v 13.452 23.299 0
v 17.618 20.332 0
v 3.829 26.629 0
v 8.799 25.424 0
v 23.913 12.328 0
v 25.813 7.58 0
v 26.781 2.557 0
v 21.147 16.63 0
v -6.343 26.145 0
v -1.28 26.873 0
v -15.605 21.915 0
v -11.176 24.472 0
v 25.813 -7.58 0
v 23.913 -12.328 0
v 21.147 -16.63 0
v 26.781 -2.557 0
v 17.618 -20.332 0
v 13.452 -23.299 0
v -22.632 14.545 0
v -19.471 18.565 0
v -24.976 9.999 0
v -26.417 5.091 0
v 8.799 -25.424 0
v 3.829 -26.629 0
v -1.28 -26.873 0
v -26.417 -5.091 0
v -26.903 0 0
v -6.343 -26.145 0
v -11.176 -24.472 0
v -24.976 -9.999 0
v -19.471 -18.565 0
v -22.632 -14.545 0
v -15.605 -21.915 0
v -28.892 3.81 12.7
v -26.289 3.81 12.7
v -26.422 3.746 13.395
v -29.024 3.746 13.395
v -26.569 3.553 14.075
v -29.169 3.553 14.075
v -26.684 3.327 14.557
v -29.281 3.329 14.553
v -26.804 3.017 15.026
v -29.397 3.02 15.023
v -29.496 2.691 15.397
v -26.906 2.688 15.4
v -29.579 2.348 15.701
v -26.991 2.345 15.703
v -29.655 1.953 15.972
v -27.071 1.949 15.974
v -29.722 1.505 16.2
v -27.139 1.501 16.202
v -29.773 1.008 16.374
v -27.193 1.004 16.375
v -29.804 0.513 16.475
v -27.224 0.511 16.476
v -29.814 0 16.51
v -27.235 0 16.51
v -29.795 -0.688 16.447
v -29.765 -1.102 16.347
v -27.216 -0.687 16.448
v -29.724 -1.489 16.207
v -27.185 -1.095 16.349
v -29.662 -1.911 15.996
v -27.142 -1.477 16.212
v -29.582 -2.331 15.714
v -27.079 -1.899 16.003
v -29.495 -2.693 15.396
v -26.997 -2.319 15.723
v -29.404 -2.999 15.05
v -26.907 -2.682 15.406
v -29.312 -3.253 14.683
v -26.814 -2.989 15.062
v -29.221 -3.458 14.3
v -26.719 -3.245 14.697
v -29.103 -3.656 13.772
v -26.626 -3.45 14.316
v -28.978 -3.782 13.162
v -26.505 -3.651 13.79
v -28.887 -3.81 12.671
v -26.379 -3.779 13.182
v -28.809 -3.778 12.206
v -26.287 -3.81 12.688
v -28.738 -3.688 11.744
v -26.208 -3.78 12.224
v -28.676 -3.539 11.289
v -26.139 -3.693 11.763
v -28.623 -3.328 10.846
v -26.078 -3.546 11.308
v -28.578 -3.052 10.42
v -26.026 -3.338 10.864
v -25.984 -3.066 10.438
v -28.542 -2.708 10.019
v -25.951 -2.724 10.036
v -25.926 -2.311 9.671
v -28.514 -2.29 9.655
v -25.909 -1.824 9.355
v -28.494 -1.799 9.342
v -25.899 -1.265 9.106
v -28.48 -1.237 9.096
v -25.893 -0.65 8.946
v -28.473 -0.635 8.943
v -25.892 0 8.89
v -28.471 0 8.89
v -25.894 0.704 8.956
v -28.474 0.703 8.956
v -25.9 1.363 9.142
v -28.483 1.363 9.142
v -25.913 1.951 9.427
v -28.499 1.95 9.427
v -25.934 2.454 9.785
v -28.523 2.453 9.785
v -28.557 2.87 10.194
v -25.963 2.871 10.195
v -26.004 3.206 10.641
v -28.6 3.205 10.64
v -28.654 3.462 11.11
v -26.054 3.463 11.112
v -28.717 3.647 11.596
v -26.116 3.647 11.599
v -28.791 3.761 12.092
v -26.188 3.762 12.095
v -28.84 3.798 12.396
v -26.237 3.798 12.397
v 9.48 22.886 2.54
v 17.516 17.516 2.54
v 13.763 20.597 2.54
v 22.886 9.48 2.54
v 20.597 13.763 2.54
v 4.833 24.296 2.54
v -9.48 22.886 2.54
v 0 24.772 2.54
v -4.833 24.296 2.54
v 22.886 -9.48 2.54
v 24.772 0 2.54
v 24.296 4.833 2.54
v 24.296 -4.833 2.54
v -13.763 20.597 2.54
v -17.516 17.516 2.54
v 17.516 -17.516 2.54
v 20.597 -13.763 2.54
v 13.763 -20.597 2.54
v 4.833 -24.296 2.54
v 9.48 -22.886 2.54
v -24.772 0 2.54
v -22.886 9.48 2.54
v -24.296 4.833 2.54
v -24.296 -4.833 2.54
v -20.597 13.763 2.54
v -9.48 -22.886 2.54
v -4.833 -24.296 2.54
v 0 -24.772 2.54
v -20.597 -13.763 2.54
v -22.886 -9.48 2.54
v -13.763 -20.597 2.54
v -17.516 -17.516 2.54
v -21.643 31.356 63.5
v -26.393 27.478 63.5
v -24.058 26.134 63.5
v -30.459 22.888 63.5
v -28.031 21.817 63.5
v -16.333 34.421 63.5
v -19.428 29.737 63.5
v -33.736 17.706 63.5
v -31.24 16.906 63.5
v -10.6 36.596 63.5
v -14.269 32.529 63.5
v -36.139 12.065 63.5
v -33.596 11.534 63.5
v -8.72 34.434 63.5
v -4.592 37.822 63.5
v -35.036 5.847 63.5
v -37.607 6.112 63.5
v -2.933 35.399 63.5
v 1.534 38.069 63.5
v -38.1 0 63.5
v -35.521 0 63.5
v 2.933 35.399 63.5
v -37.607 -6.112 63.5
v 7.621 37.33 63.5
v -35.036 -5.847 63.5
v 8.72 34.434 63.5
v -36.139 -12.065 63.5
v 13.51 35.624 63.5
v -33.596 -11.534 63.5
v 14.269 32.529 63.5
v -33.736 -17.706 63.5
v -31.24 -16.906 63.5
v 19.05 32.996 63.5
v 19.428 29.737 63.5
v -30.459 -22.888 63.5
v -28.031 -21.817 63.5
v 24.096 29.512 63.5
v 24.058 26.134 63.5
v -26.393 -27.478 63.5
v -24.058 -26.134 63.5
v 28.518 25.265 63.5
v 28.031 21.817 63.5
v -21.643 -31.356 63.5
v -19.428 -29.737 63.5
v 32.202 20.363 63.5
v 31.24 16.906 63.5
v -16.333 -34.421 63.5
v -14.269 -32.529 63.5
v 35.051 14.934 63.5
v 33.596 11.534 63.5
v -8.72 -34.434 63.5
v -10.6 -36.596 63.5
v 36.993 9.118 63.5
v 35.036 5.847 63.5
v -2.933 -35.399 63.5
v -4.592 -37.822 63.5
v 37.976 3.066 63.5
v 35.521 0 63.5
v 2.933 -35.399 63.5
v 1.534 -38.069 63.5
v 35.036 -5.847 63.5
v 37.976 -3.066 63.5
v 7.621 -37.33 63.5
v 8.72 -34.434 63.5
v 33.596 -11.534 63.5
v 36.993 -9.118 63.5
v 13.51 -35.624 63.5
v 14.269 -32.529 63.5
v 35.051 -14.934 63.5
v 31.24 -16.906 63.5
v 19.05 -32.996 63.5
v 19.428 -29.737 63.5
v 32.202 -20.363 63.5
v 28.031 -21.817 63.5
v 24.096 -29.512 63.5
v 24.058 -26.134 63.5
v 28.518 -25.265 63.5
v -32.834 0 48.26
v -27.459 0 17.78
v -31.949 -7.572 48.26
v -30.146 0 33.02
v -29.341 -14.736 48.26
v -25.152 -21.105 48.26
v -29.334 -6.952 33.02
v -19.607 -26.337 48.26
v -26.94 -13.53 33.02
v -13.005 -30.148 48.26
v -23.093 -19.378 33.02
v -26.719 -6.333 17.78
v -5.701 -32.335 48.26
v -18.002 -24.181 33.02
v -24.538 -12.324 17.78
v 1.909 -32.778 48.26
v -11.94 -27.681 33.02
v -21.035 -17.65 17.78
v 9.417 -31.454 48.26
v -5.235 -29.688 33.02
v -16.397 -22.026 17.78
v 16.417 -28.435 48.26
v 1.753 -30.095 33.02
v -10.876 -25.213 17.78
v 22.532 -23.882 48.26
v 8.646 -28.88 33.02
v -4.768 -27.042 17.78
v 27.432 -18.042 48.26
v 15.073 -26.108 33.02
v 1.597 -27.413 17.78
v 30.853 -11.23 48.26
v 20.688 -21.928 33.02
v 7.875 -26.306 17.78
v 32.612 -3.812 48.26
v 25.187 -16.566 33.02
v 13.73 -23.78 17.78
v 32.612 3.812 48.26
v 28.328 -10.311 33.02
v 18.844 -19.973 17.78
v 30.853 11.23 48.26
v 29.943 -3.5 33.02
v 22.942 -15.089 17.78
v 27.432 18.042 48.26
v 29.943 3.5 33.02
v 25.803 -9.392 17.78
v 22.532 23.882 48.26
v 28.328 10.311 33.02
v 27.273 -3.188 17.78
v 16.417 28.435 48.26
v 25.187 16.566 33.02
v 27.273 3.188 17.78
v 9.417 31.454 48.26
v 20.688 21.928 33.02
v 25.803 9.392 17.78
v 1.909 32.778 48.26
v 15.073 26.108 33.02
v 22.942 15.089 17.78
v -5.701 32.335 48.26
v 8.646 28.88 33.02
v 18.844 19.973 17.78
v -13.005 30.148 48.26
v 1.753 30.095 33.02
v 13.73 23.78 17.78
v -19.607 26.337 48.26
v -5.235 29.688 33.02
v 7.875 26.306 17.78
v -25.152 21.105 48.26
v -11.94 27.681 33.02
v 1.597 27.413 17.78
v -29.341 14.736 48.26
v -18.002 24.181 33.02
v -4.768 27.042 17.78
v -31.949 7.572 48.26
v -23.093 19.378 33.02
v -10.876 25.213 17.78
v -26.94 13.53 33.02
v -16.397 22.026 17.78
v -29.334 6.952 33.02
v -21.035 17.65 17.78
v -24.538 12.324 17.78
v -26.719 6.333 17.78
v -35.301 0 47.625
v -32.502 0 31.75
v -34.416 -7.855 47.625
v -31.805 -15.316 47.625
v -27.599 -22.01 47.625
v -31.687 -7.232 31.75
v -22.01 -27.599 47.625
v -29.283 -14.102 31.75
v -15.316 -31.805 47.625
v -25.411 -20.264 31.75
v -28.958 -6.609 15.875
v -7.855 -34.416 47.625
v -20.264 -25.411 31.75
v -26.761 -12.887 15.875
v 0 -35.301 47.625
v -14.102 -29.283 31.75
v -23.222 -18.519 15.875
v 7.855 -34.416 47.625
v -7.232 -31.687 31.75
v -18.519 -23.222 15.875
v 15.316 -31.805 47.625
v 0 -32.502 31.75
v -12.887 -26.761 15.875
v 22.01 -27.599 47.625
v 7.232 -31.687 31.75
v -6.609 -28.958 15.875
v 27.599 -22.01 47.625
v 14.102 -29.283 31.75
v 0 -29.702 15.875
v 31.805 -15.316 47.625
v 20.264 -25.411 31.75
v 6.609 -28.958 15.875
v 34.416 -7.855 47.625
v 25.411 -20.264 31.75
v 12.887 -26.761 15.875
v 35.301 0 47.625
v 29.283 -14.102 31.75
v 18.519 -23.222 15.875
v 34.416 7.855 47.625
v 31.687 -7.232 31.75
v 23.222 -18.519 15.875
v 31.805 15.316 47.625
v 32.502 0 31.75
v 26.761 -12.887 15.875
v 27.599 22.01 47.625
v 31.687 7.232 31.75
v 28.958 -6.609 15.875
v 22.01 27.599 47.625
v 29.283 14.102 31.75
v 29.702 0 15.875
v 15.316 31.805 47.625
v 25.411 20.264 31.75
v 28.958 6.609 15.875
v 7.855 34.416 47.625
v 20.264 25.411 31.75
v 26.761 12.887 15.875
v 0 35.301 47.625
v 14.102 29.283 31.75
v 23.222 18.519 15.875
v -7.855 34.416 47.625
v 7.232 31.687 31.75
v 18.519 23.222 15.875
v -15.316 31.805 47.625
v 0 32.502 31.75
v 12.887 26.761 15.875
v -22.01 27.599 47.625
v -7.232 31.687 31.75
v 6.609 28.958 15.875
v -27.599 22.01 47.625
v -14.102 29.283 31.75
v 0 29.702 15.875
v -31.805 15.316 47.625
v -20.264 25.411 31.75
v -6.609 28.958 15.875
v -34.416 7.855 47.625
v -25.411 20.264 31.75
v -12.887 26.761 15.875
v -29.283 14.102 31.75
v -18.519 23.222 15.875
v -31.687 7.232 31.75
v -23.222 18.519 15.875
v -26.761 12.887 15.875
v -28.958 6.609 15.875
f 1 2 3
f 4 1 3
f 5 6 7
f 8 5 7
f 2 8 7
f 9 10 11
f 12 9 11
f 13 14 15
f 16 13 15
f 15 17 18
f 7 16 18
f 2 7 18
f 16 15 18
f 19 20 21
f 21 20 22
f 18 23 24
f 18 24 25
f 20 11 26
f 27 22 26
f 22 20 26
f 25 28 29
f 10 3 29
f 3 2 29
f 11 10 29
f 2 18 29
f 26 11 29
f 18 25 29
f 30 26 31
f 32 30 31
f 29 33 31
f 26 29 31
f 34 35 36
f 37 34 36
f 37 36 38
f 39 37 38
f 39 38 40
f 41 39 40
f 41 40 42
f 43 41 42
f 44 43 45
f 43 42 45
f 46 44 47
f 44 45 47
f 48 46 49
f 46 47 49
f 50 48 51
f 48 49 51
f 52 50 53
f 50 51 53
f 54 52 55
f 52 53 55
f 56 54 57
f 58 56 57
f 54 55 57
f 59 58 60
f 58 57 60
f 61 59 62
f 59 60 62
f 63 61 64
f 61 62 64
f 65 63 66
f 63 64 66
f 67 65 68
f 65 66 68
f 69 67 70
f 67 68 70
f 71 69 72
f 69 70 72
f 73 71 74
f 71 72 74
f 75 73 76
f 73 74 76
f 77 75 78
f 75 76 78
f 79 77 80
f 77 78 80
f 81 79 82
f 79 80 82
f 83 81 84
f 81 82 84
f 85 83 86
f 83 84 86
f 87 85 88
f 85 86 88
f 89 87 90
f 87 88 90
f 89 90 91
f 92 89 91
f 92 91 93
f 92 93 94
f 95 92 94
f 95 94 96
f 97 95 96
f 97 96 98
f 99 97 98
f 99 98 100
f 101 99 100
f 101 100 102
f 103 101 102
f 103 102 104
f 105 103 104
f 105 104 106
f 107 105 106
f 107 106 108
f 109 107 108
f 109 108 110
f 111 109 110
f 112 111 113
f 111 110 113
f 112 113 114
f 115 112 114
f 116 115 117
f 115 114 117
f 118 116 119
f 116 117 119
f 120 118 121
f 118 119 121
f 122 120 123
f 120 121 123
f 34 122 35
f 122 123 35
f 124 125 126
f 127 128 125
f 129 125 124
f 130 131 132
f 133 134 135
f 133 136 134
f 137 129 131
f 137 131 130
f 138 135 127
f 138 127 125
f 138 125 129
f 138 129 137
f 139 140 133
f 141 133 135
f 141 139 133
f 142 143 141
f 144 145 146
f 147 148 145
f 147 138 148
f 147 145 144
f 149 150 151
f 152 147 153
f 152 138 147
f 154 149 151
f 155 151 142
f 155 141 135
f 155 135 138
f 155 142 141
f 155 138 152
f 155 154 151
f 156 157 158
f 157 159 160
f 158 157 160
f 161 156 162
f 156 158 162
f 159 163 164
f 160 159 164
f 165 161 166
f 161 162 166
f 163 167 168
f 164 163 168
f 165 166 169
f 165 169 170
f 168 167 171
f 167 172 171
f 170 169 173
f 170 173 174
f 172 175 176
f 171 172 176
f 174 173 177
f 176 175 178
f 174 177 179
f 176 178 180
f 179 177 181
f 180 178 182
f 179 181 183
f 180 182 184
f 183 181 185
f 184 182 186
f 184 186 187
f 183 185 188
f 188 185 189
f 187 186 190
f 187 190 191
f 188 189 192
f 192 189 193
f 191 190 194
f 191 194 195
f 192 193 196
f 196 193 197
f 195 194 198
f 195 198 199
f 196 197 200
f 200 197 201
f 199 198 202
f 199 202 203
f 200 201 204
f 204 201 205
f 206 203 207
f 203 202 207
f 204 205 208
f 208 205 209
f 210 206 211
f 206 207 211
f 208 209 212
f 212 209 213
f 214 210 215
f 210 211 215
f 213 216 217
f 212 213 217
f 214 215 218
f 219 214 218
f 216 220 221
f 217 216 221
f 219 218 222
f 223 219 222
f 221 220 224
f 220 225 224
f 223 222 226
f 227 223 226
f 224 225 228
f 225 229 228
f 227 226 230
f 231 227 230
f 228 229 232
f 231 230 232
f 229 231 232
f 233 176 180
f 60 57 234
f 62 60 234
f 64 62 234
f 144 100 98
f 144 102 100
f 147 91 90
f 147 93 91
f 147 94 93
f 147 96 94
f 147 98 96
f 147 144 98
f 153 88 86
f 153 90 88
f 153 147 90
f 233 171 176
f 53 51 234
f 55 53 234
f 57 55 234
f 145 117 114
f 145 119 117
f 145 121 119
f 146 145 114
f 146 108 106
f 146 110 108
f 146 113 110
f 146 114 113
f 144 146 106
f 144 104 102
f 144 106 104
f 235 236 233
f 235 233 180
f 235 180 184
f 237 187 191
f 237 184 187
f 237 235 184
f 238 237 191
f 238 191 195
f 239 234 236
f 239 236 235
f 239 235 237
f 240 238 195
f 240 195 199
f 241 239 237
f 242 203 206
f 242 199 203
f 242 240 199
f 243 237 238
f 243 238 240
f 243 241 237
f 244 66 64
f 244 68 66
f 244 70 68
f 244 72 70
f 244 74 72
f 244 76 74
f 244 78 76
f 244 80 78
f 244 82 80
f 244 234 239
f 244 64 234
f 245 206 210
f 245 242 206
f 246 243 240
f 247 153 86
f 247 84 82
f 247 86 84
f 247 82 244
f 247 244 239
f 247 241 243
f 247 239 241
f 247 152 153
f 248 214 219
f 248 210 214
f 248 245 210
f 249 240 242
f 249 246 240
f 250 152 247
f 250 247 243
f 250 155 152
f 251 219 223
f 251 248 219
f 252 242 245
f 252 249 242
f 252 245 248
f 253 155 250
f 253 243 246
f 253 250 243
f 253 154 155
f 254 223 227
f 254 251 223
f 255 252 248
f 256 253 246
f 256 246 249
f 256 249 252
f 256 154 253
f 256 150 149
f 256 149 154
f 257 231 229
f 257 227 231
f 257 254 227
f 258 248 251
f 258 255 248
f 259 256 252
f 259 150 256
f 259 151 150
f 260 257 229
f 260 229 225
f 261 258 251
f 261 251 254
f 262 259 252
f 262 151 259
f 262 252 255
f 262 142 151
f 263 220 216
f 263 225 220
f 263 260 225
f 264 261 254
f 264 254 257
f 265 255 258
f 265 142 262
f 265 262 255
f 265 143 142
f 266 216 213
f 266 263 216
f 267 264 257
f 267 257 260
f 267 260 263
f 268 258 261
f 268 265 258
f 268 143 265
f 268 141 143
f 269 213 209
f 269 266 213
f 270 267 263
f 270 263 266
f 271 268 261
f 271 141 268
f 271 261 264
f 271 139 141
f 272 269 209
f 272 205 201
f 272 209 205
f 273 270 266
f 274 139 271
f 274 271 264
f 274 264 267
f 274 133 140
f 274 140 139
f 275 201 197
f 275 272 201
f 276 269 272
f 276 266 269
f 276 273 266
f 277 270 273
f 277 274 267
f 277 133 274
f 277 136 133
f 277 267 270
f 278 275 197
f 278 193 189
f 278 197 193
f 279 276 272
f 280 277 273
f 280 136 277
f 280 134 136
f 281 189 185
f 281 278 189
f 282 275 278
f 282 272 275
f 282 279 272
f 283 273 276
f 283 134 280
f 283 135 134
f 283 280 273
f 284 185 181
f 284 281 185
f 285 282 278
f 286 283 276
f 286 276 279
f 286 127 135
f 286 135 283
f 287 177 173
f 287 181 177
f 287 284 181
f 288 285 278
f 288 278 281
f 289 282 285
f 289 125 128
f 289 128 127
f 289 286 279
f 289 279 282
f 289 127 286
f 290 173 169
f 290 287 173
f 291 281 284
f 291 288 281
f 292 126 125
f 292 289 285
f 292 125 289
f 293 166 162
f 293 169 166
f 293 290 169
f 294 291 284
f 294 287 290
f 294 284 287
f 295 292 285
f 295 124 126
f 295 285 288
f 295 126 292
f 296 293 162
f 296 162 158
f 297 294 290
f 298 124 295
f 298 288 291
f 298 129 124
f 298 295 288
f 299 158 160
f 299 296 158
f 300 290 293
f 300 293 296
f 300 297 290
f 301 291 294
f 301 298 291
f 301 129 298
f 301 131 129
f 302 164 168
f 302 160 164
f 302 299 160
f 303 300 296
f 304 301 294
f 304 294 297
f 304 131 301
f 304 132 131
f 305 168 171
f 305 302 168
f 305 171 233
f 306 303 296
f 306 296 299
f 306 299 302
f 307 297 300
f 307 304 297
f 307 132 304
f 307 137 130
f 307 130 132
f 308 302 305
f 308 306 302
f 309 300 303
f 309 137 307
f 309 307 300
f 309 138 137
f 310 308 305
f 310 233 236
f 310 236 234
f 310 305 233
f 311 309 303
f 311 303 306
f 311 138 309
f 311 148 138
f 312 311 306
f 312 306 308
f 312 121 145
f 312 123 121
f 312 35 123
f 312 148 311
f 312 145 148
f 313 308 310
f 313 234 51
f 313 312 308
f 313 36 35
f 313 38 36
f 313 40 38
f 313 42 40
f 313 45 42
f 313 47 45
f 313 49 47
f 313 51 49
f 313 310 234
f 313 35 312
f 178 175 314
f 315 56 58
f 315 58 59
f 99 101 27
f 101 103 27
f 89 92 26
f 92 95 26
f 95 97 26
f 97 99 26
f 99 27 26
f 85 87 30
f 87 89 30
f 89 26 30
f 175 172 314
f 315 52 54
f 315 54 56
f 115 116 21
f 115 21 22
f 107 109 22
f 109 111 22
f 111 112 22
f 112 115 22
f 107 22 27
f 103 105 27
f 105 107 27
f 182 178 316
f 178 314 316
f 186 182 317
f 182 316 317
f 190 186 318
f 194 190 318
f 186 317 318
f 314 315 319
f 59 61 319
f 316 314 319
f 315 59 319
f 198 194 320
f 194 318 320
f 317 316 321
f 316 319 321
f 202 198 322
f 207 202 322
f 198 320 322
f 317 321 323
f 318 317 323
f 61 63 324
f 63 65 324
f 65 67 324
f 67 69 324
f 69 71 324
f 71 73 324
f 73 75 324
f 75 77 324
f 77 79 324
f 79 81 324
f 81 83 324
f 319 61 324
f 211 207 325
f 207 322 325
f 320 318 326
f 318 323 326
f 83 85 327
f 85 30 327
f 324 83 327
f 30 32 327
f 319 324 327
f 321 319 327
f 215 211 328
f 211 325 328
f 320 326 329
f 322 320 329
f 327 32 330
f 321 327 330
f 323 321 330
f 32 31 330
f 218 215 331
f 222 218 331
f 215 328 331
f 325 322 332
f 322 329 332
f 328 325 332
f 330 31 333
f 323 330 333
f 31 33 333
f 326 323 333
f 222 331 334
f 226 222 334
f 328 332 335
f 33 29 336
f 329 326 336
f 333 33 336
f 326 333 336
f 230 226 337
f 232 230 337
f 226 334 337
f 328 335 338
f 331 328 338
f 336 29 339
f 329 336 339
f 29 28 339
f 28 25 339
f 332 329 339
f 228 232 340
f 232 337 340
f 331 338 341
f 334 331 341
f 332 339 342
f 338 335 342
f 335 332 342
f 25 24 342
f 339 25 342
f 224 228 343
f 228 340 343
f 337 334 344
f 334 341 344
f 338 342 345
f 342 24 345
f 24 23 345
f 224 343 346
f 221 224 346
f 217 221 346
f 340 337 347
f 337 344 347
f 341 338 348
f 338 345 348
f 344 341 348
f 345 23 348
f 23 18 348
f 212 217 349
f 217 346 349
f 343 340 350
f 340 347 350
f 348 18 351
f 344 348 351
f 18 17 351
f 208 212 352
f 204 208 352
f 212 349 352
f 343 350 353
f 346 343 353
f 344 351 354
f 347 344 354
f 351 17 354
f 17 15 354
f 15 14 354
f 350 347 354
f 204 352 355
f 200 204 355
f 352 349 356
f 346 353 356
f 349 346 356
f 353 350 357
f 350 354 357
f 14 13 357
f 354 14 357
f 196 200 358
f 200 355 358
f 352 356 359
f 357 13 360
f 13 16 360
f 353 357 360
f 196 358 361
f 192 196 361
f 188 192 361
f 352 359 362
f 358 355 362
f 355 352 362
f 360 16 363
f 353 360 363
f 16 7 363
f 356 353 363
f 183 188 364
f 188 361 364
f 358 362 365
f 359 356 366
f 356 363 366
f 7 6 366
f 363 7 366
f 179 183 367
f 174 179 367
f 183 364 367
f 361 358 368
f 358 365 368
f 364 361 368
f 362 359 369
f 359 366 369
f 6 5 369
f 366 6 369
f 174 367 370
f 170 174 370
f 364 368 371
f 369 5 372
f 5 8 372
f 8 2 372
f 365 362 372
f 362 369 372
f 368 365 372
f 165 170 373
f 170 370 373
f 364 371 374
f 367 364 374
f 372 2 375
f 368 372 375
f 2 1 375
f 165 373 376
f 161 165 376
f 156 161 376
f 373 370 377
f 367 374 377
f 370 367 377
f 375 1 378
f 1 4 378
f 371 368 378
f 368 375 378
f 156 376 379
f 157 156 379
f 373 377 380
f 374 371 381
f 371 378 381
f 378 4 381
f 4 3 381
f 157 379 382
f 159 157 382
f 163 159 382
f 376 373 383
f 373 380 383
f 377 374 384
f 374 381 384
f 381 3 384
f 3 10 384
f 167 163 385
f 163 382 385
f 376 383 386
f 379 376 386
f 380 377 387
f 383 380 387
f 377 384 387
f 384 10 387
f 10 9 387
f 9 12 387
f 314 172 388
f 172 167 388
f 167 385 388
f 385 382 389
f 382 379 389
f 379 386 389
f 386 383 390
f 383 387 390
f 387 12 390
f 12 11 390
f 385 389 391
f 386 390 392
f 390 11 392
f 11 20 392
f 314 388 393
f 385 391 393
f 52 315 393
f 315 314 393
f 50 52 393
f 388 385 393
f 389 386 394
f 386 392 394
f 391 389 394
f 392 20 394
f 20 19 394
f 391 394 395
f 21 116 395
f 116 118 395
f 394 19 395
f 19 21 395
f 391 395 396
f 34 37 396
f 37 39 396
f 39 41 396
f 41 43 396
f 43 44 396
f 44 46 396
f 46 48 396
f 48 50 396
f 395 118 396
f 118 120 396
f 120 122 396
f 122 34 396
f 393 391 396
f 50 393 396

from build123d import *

# Parameters (mm, degrees)
F3_T     = -2.54
F5_D     = 7.62
F5_DEPTH = 38.101


# Not quite as in the source:
# - a feature of the source that left no trace in its solid (it failed there, or was rolled back) is left out


with BuildPart() as f1:
    # F0 (on Front) → F1 (revolve)
    with BuildSketch(Plane.XZ):
        Polygon((0, 0), (0, 63.5), (-38.1, 63.5), (-26.903236725, 0), align=None)
    revolve(axis=Axis((0, 0, 31.75), (0, 0, 1)))

    # F3
    f3_openings = [f1.faces().sort_by_distance(p)[0] for p in [
        (0, 0, 63.5),
    ]]
    offset(amount=F3_T, openings=f3_openings)

    # F5 (through all, one way)
    with BuildSketch(Plane.YZ):
        with Locations((0, 12.7)):
            Circle(F5_D / 2)
    extrude(amount=-F5_DEPTH, mode=Mode.SUBTRACT)


solid = f1.part
